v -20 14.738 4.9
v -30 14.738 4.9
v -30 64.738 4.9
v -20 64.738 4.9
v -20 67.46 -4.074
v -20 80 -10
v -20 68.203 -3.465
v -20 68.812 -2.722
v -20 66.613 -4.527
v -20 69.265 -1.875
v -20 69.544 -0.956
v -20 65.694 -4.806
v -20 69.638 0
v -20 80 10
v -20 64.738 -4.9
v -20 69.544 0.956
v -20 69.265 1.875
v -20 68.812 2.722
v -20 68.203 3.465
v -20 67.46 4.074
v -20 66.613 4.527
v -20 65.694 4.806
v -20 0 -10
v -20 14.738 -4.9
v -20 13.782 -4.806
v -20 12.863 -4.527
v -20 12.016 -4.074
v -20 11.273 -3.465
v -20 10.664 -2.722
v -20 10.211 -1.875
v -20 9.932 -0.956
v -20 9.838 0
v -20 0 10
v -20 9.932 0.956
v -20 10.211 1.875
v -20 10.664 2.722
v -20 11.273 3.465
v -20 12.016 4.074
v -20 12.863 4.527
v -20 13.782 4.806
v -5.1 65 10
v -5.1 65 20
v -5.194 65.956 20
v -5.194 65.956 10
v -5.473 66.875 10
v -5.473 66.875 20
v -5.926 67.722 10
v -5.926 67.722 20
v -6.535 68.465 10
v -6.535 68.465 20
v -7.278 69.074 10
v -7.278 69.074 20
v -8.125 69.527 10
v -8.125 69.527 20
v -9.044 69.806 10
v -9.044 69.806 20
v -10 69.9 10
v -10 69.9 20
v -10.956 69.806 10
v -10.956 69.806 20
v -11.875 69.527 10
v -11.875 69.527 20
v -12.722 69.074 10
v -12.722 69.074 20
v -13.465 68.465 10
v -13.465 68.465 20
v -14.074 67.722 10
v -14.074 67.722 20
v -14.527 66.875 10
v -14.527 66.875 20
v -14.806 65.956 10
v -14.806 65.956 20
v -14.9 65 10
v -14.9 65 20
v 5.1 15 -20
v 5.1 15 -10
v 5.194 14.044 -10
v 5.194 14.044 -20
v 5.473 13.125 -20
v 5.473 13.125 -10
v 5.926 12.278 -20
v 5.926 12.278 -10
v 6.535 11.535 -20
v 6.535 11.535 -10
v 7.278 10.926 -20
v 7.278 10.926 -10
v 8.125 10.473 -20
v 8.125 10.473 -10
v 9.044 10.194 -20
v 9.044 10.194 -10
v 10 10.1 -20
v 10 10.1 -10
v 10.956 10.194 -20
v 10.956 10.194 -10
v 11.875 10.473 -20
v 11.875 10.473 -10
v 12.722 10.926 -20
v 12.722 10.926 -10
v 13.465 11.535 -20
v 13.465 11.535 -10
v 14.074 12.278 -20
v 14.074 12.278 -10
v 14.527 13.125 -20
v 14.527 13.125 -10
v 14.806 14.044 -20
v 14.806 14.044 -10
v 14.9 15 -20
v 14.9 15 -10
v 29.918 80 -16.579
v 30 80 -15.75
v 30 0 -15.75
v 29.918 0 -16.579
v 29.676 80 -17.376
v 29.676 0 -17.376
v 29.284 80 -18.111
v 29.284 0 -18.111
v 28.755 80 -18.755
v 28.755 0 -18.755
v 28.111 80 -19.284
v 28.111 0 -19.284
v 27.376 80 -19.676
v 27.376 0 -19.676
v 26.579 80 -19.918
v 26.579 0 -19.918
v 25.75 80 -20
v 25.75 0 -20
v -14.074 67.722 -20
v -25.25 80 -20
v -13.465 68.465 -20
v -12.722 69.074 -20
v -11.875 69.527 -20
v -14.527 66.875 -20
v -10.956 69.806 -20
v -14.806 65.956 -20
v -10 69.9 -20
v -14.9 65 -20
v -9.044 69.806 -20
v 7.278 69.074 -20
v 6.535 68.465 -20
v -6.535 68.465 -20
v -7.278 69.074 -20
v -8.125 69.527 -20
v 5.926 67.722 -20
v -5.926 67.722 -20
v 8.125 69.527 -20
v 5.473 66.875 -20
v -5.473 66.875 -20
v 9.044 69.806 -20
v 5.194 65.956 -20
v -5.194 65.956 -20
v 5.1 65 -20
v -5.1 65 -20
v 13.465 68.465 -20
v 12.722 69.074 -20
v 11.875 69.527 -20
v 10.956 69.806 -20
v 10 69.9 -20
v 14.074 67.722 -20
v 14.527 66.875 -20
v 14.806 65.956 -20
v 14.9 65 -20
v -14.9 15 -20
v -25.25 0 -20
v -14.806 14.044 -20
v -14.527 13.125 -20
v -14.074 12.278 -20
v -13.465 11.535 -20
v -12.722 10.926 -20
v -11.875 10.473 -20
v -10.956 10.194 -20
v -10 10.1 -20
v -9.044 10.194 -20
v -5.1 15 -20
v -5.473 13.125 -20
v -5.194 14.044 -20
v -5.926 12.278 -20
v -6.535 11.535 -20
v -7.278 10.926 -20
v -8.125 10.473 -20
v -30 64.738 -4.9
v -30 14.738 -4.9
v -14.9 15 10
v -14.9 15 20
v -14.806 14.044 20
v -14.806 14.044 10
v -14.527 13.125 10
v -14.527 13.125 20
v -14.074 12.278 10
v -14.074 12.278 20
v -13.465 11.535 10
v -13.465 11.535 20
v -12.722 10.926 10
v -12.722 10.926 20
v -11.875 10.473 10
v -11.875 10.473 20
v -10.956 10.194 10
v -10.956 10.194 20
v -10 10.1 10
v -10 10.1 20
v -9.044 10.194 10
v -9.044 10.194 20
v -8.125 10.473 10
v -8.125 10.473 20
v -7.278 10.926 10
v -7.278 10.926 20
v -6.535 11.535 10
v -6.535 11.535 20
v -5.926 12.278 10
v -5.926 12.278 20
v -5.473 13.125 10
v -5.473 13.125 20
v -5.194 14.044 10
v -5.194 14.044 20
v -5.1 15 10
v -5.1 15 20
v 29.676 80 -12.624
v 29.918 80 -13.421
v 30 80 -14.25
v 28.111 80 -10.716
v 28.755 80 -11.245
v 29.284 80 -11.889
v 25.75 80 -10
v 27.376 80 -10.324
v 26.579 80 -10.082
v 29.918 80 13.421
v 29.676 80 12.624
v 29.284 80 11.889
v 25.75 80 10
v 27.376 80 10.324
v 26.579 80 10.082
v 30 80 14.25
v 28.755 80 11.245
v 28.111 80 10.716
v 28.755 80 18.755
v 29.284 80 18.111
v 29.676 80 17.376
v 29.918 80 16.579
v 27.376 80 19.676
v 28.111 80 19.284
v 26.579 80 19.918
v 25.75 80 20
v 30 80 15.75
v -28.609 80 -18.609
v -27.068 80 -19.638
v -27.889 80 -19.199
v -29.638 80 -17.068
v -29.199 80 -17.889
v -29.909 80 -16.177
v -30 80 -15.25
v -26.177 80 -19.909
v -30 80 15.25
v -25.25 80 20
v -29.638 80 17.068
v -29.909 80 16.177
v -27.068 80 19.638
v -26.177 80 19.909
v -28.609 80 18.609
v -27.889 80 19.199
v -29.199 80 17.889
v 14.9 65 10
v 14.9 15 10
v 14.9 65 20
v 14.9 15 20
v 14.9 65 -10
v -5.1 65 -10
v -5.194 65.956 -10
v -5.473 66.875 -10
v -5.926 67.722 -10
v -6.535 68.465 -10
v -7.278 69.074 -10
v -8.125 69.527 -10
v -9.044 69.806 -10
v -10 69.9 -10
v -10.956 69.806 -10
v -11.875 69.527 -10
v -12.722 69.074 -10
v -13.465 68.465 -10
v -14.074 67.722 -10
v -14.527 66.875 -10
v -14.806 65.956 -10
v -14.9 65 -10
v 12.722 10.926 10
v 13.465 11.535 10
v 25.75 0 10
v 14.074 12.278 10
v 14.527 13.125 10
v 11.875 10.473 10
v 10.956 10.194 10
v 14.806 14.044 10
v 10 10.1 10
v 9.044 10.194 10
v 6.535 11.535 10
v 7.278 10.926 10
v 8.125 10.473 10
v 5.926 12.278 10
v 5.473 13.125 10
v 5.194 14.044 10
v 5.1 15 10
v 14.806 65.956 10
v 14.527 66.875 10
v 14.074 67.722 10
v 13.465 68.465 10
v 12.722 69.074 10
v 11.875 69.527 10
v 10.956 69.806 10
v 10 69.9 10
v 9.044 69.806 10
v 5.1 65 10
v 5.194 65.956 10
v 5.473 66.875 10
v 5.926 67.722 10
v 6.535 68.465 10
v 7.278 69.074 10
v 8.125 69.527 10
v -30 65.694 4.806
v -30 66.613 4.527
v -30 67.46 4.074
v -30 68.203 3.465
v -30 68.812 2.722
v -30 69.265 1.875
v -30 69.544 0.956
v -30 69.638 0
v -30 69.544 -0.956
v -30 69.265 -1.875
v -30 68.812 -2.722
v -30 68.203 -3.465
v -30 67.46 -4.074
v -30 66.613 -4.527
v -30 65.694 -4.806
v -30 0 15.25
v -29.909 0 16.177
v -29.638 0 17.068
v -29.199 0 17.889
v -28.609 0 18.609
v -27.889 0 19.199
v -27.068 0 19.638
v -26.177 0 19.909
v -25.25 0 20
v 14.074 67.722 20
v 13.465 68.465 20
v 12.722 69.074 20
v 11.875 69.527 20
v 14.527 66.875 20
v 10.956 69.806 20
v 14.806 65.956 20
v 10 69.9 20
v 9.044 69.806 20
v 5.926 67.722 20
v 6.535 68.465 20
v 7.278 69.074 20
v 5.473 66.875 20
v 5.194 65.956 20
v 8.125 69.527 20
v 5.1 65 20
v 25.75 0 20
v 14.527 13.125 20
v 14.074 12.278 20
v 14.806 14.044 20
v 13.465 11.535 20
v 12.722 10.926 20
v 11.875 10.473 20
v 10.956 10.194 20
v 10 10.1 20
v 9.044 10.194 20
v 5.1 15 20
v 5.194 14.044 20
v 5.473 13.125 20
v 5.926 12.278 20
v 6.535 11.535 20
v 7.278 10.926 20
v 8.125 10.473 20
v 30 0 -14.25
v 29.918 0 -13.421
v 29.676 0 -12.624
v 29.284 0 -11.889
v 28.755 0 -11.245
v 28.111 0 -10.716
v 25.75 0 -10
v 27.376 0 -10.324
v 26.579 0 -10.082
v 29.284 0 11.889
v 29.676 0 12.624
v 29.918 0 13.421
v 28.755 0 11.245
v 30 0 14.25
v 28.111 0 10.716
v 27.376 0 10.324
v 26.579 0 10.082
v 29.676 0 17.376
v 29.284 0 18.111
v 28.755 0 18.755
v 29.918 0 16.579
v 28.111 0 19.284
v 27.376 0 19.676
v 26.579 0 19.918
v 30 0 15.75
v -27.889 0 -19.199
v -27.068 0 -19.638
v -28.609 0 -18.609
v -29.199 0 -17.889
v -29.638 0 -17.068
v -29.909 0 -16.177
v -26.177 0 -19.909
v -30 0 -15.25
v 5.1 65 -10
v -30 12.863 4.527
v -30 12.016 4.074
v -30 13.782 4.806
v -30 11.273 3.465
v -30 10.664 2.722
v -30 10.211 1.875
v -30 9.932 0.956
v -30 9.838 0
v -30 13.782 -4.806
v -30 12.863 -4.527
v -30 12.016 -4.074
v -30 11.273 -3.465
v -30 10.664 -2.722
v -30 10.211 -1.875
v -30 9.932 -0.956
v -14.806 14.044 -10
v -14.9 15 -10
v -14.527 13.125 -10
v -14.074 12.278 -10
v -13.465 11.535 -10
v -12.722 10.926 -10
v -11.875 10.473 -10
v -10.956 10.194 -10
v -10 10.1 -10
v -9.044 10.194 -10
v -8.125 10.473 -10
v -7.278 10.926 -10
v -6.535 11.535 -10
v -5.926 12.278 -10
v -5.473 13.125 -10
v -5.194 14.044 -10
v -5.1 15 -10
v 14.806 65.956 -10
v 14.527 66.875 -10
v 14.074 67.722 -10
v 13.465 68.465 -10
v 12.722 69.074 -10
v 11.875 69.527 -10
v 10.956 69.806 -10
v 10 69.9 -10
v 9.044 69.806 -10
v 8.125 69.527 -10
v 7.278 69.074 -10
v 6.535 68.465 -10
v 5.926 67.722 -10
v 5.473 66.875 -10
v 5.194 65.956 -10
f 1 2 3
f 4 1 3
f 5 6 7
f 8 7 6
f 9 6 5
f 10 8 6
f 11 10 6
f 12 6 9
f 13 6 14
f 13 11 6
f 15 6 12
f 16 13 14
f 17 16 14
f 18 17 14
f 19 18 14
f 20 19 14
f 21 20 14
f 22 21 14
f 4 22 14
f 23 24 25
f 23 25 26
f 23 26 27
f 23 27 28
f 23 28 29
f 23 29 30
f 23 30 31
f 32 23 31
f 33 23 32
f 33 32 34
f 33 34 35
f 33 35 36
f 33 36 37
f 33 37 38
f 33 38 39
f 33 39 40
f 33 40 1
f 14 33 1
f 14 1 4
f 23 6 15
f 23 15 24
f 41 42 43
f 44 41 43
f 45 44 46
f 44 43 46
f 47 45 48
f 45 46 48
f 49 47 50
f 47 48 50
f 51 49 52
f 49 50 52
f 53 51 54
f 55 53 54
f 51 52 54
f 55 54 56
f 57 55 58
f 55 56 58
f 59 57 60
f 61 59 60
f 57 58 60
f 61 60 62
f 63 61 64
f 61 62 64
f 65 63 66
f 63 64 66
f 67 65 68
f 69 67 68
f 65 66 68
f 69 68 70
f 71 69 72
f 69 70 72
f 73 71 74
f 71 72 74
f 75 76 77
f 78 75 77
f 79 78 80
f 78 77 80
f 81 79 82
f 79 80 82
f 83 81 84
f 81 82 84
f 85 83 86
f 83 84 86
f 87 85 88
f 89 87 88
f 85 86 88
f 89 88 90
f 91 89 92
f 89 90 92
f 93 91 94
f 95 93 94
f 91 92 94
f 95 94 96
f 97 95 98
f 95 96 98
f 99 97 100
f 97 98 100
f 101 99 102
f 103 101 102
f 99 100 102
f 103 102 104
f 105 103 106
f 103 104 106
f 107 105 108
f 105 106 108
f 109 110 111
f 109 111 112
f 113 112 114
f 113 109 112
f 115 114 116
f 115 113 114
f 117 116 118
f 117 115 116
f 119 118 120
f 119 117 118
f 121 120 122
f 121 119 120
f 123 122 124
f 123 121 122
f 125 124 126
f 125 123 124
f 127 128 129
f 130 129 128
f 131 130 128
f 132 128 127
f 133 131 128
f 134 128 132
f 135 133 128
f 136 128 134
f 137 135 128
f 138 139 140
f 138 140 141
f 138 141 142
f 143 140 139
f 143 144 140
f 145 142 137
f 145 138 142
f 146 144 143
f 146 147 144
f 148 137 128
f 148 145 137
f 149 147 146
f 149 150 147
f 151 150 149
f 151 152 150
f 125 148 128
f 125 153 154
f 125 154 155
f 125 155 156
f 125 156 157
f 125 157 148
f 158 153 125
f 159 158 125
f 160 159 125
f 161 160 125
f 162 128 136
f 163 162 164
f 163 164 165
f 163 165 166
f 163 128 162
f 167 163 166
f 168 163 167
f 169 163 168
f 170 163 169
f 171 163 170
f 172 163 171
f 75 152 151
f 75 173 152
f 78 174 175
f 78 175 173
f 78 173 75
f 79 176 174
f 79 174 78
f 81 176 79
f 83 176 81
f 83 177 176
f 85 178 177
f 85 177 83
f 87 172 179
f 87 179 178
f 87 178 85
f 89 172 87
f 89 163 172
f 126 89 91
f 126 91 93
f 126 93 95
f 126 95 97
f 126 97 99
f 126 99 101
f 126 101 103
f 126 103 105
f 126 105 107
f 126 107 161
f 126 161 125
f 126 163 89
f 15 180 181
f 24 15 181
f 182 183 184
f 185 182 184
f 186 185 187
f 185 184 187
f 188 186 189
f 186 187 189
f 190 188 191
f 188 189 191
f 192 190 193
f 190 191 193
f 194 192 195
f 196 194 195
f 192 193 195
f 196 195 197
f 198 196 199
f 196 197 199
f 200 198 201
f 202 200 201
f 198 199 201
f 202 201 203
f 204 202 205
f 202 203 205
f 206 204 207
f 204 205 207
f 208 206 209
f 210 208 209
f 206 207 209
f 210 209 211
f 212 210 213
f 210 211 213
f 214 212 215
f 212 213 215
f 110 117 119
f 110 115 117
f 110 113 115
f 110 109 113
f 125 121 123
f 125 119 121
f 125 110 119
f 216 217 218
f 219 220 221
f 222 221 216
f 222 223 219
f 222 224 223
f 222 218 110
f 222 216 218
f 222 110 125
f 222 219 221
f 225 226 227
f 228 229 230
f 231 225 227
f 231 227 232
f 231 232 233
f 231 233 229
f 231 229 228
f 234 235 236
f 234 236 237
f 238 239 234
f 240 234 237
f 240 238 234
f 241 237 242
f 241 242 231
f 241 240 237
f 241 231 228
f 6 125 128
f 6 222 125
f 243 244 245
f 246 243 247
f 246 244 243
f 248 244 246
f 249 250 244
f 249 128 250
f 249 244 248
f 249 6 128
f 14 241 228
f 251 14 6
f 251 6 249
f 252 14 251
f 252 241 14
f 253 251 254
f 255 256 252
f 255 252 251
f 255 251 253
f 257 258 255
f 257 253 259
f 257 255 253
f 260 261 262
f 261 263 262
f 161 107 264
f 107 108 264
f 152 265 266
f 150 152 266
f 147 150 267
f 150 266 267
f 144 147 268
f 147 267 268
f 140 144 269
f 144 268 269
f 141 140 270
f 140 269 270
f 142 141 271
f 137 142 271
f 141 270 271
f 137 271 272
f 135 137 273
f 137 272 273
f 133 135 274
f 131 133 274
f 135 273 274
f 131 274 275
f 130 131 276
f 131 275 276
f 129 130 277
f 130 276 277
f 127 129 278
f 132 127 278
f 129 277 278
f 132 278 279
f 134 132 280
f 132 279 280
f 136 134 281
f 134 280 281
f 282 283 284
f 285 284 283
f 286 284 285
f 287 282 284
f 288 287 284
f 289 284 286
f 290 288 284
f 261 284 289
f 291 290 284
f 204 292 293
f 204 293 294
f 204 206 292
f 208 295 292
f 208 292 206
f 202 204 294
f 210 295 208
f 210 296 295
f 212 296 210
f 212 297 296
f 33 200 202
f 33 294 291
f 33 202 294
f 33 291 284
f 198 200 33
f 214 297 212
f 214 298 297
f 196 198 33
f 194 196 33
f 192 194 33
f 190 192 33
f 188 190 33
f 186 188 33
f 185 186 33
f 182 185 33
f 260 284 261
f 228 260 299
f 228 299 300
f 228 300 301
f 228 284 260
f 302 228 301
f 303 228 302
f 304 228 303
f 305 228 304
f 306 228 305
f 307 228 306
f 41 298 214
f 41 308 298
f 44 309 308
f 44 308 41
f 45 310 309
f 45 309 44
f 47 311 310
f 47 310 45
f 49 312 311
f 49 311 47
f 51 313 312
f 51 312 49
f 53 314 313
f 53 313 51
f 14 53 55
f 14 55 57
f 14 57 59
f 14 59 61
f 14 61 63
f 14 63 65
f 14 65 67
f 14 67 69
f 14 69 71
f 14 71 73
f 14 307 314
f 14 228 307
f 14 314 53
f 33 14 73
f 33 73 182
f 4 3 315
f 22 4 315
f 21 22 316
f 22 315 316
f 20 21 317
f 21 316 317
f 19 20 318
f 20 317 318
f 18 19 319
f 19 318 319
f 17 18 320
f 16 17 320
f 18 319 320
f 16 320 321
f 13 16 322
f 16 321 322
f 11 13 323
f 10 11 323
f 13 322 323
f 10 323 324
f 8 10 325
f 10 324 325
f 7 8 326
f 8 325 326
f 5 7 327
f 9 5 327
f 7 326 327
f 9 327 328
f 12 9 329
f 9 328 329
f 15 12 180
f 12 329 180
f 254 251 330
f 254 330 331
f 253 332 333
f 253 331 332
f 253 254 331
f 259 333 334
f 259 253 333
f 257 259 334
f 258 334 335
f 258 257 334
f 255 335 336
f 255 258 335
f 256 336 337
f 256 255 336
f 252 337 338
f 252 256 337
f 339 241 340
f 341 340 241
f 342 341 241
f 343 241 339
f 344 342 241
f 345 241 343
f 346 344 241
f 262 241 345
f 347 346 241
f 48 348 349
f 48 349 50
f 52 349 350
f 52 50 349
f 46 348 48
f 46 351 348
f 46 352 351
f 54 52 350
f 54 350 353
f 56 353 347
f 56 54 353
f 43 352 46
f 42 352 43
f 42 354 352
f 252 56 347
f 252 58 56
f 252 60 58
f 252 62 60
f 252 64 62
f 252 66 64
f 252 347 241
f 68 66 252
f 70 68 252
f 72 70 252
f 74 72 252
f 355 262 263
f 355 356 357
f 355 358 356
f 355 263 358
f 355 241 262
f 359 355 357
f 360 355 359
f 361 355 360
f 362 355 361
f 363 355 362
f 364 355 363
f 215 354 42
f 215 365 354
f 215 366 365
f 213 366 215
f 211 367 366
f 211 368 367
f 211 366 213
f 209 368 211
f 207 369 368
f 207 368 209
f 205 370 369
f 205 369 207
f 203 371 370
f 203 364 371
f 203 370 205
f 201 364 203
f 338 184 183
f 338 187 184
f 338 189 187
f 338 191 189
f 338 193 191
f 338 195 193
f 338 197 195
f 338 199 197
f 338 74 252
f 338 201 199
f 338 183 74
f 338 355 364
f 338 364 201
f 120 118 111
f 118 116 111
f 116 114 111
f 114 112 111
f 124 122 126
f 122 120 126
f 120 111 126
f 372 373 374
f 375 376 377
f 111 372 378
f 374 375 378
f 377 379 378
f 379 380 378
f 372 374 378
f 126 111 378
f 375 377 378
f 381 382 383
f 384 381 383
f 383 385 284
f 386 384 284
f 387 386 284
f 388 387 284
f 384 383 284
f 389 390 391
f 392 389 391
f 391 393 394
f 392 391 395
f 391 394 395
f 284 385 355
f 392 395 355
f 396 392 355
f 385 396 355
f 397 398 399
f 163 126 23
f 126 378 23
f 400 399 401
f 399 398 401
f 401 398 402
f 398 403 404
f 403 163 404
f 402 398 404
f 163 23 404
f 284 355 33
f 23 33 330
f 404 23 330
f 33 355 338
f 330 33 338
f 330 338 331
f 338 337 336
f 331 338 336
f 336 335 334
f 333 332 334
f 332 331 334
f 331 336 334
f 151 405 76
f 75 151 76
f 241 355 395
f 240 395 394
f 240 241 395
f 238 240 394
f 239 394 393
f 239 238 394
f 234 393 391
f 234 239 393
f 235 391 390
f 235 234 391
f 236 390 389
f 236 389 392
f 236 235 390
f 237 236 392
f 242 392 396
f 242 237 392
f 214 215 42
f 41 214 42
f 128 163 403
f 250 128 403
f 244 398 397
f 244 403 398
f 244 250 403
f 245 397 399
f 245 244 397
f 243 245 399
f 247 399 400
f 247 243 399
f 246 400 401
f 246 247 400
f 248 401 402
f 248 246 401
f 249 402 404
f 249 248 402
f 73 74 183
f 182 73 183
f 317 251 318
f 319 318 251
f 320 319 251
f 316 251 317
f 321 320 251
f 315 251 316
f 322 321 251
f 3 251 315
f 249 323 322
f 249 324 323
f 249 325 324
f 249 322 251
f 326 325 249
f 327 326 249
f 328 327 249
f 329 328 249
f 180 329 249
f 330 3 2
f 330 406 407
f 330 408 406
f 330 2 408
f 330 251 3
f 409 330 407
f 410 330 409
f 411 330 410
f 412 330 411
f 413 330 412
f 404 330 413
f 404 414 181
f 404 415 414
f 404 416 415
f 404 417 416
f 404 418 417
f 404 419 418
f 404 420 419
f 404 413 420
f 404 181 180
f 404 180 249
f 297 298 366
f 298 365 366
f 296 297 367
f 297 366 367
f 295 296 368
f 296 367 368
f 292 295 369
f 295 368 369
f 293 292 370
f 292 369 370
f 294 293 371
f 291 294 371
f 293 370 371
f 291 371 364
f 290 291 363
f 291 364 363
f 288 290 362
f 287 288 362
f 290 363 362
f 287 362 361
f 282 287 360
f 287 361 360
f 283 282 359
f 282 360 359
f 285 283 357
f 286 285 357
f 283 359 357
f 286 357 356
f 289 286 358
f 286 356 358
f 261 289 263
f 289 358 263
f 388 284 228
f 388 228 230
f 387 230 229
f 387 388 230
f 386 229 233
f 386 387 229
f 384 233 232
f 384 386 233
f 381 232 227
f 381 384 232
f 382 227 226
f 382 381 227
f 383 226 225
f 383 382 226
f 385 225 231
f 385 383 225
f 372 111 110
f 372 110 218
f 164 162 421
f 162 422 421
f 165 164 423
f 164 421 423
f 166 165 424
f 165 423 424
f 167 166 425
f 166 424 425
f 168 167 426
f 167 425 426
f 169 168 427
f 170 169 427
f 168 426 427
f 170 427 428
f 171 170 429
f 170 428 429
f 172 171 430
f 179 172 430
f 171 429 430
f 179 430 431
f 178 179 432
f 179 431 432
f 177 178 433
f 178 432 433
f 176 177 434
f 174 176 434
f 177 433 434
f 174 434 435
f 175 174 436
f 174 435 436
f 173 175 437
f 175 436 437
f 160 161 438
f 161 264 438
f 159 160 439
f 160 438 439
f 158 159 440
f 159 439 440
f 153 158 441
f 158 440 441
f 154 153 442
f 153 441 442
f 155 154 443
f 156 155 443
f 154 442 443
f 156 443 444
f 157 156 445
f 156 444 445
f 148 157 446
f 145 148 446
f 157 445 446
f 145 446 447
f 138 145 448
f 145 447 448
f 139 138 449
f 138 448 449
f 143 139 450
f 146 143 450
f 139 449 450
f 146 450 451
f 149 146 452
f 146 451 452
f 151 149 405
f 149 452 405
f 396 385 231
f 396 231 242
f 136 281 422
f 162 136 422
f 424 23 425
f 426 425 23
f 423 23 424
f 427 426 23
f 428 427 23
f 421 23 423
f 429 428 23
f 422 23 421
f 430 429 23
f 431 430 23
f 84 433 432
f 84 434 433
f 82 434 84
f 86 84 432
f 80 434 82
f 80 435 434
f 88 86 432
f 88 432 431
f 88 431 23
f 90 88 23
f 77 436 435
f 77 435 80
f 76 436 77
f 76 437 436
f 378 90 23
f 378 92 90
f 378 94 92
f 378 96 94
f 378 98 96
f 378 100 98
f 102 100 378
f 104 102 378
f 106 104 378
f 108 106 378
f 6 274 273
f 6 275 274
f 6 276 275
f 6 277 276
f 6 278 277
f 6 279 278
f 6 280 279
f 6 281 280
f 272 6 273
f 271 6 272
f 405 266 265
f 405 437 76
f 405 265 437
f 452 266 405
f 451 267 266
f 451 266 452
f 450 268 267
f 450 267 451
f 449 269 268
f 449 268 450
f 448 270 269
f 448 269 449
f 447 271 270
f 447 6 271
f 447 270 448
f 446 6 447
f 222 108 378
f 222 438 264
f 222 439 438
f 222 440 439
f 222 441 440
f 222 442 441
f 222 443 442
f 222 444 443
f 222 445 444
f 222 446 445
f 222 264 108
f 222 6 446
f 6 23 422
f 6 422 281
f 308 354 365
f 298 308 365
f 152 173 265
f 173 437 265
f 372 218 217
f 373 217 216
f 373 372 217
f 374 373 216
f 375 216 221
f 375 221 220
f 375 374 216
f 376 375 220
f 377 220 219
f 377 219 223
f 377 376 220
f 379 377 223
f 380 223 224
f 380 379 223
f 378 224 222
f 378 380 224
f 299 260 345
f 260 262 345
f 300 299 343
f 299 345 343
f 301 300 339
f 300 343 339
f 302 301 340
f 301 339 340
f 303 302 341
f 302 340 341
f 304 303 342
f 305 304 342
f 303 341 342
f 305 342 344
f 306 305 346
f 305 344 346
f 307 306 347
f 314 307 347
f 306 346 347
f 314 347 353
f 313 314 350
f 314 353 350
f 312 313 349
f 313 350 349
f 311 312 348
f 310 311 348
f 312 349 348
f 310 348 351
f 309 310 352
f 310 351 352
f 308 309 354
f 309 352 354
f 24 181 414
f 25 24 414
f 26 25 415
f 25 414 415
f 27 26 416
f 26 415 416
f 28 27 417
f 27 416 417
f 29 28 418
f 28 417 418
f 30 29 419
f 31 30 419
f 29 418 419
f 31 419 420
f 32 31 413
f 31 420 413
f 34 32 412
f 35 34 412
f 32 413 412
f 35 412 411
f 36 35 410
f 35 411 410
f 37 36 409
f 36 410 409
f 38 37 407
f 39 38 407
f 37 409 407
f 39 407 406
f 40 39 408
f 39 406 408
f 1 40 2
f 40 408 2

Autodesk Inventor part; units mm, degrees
ref_plane "YZ Plane" through (0, 0, 0) normal (1, 0, 0) x (0, 1, 0)
ref_plane "XZ Plane" through (0, 0, 0) normal (0, 1, 0) x (-1, 0, 0)
ref_plane "XY Plane" through (0, 0, 0) normal (0, 0, 1) x (1, 0, 0)
sketch "Sketch1" plane through (0, 0, 0) normal (0, 1, 0) x (-1, 0, 0)
  line L0 (20, 10) -> (-20, 10)
  line L1 (-20, 10) -> (-20, -10)
  line L2 (-20, -10) -> (20, -10)
  line L3 (20, -10) -> (20, 10)
  line L4 (20, 10) -> (-20, -10) construction
  line L5 (-20, 10) -> (20, -10) construction
  line L6 (-30, 20) -> (30, 20)
  line L7 (30, 20) -> (30, -20)
  line L8 (30, -20) -> (-30, -20)
  line L9 (-30, -20) -> (-30, 20)
  line L10 (30, 0) -> (-30, 0) construction
  line L11 (-20, 0) -> (-10, 0) construction
  line L12 (-10, 10) -> (-10, -10) construction
  line L13 (20, 10) -> (10, 10) construction
  line L14 (10, 10) -> (10, -10) construction
  point P0 (0, 0)
  dimension "d0" = 40
  dimension "d1" = 20
  dimension "d2" = 10
  dimension "d3" = 10
  dimension "d4" = 10
extrude "Extrusion1" add sketch "Sketch1" along normal blind 80
sketch "Sketch2" plane through (-30, 0, 20) normal (0, 0, 1) x (1, 0, 0)
  line L0 (0, 0) -> (0, 80) projected
  line L1 (0, 40) -> (20, 40) construction
  line L2 (60, 0) -> (60, 80) projected
  line L3 (60, 40) -> (40, 40) construction
  line L4 (50, 0) -> (10, 0) projected
  line L5 (20, 0) -> (20, 70) construction
  line L6 (40, 0) -> (40, 80) construction
  line L7 (60, 80) -> (0, 80) projected
  line L8 (20, 65) -> (20, 15) construction
  line L9 (15.1, 65) -> (15.1, 15)
  line L10 (24.9, 15) -> (24.9, 65)
  arc A0 (24.9, 65) -> (15.1, 65) centre (20, 65) ccw
  arc A1 (15.1, 15) -> (24.9, 15) centre (20, 15) ccw
  line L11 (40, 65) -> (40, 15) construction
  line L12 (35.1, 65) -> (35.1, 15)
  line L13 (44.9, 15) -> (44.9, 65)
  arc A2 (44.9, 65) -> (35.1, 65) centre (40, 65) ccw
  arc A3 (35.1, 15) -> (44.9, 15) centre (40, 15) ccw
  point P0 (30, 0)
  dimension "d7" = 20
  dimension "d8" = 20
  dimension "d9" = 25
  dimension "d10" = 9.8
  dimension "d11" = 9.8
extrude "Extrusion2" cut sketch "Sketch2" against normal through all
sketch "Sketch3" plane through (-30, 0, -20) normal (-1, 0, 0) x (0, 0, 1)
  line L0 (20, 0) -> (20, 79.4763) construction
  line L1 (20, 64.7382) -> (20, 14.7382) construction
  line L2 (15.1, 64.7382) -> (15.1, 14.7382)
  line L3 (24.9, 14.7382) -> (24.9, 64.7382)
  arc A0 (24.9, 64.7382) -> (15.1, 64.7382) centre (20, 64.7382) ccw
  arc A1 (15.1, 14.7382) -> (24.9, 14.7382) centre (20, 14.7382) ccw
  point P0 (20, 39.7382)
  dimension "d14" = 25
  dimension "d15" = 9.8
extrude "Extrusion3" cut sketch "Sketch3" against normal blind 10
sketch "Sketch5" plane through (0, 80, 0) normal (0, 1, 0) x (1, 0, 0)
  line L0 (-20, 10) -> (20, 10) projected
  line L1 (30, -20) -> (30, 20) projected
  line L2 (20, 10) -> (30, 10)
  line L3 (30, 10) -> (30, -10)
  line L4 (30, -10) -> (20, -10)
  line L5 (20, -10) -> (20, 10)
  point P0 (0, 0)
  dimension "d18" = 20
extrude "Extrusion4" cut sketch "Sketch5" against normal through all
fillet "Fillet1" radius 4.25 4 edges at (30, 40, 10) (30, 40, -10) (30, 40, -20) (30, 40, 20)
fillet "Fillet2" radius 4.75 2 edges at (-30, 40, 20) (-30, 40, -20)
properties part number "VerticalBeamMount" material "ABS Plastic"
